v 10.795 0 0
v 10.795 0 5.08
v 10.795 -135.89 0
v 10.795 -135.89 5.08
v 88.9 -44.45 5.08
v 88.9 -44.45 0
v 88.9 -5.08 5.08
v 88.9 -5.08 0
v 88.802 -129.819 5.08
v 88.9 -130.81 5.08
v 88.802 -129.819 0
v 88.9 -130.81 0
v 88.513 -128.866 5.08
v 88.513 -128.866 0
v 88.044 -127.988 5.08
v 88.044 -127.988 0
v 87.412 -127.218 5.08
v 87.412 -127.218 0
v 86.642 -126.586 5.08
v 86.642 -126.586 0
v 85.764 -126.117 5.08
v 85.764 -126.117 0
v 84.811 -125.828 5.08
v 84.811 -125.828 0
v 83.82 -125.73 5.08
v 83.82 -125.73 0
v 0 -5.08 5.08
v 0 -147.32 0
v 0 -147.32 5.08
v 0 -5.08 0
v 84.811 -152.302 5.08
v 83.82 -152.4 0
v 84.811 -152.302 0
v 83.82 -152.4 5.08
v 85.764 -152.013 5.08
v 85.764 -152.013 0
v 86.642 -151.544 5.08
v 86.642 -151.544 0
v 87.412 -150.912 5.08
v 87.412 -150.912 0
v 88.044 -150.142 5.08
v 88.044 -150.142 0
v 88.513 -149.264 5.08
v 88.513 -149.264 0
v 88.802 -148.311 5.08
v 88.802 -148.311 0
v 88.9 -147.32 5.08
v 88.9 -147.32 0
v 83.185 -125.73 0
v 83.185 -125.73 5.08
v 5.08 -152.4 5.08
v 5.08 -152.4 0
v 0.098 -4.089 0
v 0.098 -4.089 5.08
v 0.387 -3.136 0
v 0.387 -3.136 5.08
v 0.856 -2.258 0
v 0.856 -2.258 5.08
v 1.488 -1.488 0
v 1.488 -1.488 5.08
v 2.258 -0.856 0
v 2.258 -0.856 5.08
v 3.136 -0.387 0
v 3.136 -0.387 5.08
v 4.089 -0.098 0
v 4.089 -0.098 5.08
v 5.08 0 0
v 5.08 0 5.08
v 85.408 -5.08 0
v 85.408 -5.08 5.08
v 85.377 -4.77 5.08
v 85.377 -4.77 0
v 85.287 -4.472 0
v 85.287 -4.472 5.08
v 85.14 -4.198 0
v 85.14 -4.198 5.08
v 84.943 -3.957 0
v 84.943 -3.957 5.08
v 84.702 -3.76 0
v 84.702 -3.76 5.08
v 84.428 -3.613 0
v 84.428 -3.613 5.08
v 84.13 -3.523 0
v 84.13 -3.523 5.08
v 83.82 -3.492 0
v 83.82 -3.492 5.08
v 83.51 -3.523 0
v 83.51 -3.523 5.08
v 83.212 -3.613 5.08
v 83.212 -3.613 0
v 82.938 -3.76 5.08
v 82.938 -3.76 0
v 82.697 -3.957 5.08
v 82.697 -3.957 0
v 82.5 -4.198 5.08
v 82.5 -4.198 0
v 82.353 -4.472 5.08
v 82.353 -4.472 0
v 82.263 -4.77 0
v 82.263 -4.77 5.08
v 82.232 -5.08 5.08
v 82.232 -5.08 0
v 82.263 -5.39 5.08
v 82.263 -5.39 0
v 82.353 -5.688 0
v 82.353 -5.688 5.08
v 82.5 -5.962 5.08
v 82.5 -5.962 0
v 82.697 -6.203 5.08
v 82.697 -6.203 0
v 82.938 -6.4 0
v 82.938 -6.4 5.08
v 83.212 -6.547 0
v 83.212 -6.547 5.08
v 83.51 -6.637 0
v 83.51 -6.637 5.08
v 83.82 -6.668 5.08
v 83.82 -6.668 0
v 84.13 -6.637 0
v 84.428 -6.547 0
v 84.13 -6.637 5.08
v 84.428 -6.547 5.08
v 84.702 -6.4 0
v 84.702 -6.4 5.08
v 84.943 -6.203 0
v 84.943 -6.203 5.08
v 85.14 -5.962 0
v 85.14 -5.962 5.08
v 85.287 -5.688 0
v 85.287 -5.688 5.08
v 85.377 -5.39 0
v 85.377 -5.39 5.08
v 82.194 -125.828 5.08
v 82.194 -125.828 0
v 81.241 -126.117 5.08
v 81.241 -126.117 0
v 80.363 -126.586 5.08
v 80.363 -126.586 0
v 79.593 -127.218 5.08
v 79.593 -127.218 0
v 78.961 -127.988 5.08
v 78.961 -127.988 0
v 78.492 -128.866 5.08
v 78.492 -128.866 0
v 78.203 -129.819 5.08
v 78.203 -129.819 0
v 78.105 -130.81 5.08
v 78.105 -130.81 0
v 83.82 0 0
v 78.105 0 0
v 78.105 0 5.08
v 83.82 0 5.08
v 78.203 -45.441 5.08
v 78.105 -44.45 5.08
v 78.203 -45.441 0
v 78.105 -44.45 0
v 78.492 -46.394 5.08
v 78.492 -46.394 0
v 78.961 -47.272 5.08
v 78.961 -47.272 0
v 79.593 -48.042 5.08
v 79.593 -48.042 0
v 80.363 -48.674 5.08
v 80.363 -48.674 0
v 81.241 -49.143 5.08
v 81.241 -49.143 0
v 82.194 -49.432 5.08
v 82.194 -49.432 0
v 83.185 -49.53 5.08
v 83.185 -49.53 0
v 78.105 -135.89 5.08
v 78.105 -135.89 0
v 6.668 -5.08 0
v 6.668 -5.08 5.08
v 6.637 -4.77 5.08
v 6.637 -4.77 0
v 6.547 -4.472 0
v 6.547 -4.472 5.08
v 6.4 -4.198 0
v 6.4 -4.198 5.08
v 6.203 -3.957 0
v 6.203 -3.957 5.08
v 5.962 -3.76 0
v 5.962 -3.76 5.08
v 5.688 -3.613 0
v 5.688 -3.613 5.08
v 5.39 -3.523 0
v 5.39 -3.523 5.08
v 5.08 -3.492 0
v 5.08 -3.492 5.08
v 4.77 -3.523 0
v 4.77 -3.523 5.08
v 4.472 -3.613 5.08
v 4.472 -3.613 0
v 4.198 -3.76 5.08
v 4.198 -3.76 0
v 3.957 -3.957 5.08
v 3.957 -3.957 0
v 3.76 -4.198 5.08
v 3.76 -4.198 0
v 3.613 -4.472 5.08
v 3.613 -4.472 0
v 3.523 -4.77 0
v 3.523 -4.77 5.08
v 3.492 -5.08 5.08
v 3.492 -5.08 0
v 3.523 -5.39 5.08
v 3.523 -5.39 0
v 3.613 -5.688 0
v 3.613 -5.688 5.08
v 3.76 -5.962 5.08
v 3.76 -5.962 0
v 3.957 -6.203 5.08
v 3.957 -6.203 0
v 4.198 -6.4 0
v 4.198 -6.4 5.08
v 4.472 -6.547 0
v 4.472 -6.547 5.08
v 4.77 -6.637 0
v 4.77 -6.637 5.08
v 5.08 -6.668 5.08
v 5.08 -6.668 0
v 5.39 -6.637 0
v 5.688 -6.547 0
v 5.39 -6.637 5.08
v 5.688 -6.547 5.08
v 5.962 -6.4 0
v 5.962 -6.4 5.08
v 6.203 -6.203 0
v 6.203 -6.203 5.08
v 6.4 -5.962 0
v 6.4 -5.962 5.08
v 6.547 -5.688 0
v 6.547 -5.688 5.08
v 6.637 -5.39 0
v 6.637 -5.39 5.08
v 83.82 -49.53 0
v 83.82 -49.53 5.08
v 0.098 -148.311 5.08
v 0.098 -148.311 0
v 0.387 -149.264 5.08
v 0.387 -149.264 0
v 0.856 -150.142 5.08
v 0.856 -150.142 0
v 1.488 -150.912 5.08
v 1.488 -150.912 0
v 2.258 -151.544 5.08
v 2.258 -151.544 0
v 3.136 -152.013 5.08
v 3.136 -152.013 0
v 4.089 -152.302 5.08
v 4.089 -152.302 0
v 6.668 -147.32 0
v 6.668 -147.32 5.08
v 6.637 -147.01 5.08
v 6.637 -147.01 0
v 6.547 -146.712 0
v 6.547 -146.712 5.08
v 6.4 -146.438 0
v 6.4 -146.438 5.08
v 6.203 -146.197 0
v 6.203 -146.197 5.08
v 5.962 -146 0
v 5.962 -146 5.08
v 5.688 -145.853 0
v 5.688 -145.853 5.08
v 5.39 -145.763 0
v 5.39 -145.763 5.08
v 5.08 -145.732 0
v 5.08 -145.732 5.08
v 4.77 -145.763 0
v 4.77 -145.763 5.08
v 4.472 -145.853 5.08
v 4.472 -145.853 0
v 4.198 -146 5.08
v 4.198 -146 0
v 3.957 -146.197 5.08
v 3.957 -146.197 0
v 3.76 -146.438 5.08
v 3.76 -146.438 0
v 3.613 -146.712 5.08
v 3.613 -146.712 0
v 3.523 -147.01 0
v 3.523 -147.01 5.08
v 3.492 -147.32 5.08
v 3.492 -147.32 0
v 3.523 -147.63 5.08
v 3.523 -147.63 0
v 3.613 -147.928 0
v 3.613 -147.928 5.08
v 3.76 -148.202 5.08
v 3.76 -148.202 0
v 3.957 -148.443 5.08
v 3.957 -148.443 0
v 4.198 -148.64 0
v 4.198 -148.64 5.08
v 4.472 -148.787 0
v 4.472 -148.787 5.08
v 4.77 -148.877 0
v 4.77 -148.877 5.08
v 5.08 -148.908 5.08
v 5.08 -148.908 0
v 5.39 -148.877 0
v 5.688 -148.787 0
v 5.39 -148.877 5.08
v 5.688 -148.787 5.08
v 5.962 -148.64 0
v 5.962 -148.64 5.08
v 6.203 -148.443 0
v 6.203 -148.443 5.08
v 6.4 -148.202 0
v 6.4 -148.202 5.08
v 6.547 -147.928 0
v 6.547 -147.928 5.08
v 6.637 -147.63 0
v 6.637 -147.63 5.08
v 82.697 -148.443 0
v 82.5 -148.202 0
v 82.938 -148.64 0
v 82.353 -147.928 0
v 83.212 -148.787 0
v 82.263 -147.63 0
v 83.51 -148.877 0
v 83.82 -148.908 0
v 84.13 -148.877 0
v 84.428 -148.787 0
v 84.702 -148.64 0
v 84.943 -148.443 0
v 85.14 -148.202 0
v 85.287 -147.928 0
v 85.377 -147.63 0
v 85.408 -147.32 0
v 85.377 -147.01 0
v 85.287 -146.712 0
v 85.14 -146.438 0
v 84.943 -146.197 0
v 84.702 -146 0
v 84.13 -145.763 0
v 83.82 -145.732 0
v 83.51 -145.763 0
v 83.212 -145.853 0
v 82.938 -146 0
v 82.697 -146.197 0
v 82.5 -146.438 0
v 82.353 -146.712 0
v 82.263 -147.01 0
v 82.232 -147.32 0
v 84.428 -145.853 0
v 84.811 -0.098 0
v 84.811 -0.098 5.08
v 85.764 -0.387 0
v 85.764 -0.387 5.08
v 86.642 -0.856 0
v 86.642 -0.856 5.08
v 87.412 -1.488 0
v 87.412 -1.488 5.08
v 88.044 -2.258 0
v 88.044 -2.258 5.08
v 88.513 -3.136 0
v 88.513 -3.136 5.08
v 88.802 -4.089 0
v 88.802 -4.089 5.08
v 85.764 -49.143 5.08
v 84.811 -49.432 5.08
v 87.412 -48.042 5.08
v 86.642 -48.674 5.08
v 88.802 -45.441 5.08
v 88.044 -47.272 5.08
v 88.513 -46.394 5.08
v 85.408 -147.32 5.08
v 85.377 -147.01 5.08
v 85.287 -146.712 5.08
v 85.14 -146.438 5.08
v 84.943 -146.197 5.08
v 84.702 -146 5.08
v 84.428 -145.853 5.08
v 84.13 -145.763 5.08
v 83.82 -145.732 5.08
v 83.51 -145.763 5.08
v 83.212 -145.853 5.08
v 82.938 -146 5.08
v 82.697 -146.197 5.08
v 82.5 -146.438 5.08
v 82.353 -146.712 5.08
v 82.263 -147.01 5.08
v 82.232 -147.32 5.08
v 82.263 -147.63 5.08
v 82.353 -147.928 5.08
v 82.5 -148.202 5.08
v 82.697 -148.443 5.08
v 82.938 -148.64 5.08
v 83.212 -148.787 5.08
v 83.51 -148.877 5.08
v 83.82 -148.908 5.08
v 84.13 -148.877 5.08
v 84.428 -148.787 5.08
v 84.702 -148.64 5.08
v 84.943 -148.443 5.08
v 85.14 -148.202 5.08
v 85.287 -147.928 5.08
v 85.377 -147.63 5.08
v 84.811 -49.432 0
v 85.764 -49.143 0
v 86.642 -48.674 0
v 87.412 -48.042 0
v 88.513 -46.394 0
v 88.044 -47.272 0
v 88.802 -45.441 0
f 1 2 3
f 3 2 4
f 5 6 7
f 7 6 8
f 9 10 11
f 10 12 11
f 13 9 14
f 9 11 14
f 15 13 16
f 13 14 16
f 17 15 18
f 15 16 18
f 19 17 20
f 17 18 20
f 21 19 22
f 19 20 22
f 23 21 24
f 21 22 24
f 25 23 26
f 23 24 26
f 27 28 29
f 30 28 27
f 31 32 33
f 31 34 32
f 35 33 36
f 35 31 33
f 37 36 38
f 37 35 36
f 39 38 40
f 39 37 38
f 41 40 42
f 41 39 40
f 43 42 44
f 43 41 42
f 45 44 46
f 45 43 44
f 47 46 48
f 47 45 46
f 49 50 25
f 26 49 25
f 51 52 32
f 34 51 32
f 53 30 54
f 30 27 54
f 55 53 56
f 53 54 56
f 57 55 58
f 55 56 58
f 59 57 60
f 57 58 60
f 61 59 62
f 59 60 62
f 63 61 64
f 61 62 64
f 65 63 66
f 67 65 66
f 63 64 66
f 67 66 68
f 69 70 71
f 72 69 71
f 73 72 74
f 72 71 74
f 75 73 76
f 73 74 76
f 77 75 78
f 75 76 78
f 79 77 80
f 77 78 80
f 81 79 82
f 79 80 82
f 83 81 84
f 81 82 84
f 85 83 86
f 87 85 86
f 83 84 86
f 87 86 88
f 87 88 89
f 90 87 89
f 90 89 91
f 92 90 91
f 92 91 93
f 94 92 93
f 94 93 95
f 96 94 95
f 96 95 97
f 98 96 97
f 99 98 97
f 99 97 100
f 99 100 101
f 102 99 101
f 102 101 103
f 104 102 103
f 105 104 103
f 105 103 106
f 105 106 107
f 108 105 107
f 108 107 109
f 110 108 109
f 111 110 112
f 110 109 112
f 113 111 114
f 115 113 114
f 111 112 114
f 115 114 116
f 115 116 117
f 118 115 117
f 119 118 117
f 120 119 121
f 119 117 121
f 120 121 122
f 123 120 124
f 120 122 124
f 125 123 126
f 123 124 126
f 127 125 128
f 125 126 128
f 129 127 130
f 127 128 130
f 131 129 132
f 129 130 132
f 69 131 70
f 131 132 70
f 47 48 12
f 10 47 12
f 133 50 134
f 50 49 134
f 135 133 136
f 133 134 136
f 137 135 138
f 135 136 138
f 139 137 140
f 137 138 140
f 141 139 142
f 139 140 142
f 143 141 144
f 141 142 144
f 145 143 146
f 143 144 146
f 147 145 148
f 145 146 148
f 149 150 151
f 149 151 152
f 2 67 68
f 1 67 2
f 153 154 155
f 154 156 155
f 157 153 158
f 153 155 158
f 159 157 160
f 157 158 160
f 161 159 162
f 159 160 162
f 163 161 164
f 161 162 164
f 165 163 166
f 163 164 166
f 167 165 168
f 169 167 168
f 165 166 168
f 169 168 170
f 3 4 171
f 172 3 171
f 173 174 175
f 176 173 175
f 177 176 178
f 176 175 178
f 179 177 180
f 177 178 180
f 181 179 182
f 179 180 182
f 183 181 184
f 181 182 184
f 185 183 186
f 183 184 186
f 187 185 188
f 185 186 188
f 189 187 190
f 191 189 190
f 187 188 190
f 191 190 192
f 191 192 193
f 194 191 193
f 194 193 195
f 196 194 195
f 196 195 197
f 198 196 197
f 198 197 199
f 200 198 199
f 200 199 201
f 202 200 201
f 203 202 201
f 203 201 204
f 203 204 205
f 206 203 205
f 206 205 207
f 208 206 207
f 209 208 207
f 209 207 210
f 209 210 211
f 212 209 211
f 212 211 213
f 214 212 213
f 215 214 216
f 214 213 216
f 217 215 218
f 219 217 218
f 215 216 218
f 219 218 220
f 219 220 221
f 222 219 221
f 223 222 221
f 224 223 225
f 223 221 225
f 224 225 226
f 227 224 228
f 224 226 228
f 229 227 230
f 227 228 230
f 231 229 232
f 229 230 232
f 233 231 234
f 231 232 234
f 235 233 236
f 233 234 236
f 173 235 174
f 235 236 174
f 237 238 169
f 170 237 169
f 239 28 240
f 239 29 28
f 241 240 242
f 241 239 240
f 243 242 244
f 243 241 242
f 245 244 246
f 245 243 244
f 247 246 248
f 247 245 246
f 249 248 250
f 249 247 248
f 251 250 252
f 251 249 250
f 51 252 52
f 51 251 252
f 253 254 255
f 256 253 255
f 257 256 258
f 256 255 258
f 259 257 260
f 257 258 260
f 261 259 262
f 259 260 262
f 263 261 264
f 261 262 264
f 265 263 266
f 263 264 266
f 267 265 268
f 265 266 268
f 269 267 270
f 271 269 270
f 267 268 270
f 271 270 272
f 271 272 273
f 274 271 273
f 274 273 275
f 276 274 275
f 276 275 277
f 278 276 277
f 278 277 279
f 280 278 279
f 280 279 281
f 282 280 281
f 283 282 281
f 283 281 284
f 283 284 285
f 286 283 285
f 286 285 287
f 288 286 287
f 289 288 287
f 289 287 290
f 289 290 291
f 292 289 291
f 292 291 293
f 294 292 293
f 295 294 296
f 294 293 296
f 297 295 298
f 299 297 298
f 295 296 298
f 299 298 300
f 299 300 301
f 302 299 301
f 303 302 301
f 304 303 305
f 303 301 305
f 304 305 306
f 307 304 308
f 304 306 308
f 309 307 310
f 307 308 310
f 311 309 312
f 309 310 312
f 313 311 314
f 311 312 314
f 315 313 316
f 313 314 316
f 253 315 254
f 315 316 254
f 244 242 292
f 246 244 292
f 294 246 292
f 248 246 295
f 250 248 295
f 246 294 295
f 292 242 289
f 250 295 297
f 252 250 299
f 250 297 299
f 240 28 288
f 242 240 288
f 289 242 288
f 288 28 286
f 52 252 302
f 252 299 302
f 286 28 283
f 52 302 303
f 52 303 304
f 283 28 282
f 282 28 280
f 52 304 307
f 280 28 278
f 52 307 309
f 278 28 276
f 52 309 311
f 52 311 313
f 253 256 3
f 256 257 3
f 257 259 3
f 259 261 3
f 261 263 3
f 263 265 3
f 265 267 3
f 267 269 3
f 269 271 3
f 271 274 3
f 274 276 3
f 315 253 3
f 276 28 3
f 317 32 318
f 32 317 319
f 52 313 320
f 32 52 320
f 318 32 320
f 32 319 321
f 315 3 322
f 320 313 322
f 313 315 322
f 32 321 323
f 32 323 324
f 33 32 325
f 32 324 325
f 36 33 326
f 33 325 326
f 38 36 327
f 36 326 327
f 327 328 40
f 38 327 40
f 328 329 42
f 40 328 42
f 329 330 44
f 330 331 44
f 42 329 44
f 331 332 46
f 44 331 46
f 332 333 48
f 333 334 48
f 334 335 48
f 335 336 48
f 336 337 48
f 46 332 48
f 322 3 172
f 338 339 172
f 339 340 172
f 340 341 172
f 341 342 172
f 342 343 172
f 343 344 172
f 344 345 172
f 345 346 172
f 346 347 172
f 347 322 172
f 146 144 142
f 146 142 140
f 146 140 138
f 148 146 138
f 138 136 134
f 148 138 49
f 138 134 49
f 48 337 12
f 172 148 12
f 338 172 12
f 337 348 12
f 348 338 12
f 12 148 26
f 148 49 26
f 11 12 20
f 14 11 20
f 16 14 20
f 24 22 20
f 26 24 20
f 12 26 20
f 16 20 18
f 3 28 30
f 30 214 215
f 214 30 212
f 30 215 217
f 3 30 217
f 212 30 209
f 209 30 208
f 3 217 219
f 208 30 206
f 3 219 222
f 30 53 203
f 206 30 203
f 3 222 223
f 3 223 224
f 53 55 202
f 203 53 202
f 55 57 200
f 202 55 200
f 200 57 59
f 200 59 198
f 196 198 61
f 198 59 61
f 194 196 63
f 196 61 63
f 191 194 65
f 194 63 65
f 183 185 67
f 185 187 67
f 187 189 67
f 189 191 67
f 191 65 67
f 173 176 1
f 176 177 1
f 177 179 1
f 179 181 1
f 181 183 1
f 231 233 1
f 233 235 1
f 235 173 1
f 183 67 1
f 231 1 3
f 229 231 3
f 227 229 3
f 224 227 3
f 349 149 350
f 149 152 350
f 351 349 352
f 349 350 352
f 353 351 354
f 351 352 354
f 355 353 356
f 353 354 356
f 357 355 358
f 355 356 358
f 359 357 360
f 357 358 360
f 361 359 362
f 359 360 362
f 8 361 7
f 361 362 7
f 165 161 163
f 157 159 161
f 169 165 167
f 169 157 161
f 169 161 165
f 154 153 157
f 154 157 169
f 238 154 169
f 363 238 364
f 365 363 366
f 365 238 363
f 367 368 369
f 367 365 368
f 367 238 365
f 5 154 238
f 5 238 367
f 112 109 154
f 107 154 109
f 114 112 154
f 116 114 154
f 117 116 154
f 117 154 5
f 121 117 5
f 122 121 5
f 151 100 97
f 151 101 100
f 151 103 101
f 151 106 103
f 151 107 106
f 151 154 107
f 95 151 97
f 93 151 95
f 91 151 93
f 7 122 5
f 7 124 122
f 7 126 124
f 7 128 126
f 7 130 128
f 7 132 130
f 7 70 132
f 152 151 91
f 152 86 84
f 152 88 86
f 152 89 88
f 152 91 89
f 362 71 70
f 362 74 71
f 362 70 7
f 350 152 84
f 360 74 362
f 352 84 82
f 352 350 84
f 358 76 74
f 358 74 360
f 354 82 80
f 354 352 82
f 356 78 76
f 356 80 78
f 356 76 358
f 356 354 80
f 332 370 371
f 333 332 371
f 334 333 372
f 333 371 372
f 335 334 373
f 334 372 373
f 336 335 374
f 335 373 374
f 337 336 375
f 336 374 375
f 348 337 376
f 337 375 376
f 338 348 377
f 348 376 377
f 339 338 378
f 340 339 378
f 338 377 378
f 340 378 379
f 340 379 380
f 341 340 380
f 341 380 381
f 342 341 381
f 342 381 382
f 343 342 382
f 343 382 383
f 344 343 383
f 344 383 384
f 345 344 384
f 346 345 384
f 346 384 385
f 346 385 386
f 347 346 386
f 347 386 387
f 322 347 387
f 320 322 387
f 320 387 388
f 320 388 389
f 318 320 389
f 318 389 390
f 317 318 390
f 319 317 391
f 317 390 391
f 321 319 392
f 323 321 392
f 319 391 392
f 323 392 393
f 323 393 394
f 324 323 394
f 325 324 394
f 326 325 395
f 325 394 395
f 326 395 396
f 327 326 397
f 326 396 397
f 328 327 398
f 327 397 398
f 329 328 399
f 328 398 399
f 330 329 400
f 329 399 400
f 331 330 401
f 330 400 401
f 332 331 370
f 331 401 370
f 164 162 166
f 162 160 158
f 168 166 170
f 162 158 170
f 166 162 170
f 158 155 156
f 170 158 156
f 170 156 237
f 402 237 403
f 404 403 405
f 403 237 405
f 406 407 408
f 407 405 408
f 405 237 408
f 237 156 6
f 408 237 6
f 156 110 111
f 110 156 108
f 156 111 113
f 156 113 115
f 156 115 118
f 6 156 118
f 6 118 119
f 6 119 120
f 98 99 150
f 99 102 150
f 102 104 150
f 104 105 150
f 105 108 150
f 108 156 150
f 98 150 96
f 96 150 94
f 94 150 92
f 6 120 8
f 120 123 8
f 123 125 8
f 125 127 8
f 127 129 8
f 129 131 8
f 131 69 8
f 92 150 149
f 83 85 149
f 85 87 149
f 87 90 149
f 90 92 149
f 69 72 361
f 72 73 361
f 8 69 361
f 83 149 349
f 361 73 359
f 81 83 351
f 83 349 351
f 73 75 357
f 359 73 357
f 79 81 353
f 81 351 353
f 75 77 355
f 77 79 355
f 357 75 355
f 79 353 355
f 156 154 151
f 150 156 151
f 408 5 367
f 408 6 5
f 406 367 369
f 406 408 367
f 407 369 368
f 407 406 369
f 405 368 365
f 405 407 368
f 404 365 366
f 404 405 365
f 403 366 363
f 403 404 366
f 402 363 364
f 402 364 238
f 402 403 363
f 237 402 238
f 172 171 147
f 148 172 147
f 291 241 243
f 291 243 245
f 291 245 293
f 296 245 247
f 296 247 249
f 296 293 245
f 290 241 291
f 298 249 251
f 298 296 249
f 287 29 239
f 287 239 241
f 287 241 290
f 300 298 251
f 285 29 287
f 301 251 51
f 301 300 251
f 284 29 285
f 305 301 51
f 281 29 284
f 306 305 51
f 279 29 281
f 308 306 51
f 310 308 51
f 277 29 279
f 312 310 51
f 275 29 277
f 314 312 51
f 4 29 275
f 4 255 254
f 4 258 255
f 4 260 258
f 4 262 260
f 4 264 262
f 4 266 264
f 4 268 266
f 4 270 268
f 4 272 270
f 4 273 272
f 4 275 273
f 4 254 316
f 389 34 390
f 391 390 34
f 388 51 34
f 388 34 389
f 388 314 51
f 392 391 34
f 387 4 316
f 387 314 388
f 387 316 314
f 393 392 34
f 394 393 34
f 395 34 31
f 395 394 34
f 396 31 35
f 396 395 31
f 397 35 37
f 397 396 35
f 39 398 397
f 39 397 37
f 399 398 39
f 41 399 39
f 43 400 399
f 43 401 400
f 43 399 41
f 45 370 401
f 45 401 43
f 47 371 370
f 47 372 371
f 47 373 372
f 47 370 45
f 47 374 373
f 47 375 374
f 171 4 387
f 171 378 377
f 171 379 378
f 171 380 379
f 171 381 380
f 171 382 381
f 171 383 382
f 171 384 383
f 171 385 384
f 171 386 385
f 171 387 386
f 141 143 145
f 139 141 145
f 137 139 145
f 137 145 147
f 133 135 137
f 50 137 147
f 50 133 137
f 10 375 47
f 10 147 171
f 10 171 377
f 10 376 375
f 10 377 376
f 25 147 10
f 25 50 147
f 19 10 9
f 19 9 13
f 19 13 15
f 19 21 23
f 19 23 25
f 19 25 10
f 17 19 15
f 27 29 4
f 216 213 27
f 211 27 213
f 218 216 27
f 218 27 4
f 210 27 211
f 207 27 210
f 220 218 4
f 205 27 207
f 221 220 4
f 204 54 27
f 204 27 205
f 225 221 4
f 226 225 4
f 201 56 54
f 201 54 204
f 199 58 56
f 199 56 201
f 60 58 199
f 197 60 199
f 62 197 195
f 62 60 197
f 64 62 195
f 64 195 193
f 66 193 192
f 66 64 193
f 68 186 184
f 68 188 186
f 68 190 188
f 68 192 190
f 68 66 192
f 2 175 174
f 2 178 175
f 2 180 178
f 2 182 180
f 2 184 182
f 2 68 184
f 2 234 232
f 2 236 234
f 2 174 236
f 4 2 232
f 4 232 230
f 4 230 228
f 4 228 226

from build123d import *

# Parameters (mm, degrees)
F0_W     = 88.9
F0_H     = 152.4
F1_DEPTH = 5.08
F3_DEPTH = 25.4
F4_R     = 1.5875
F5_DEPTH = 25.4
F6_R     = 5.08


with BuildPart() as f1:
    # F0 (on Top) → F1 (new body)
    with BuildSketch(Plane.XY):
        with Locations((44.45, -76.2)):
            Rectangle(F0_W, F0_H)
    extrude(amount=F1_DEPTH)

    # F2 (on face) → F3 (cut)
    with BuildSketch(Plane.XY.offset(5.08)):
        Polygon((78.105, 0), (10.795, 0), (10.795, -135.89), (78.105, -135.89), (78.105, -125.73), (88.9, -125.73), (88.9, -49.53), (78.105, -49.53), align=None)
    extrude(amount=-F3_DEPTH, mode=Mode.SUBTRACT)

    # F4 (on face) → F5 (cut)
    with BuildSketch(Plane.XY.offset(5.08)):
        with Locations((5.08, -147.32)):
            Circle(F4_R)
        with Locations((83.82, -147.32)):
            Circle(F4_R)
        with Locations((83.82, -5.08)):
            Circle(F4_R)
        with Locations((5.08, -5.08)):
            Circle(F4_R)
    extrude(amount=-F5_DEPTH, mode=Mode.SUBTRACT)

    # F6
    f6_edges = [f1.edges().sort_by_distance(p)[0] for p in [
        (0, -152.4, 2.54),
        (88.9, -152.4, 2.54),
        (0, 0, 2.54),
        (88.9, 0, 2.54),
        (78.105, -49.53, 2.54),
        (88.9, -49.53, 2.54),
        (88.9, -125.73, 2.54),
        (78.105, -125.73, 2.54),
    ]]
    fillet(f6_edges, radius=F6_R)


solid = f1.part
